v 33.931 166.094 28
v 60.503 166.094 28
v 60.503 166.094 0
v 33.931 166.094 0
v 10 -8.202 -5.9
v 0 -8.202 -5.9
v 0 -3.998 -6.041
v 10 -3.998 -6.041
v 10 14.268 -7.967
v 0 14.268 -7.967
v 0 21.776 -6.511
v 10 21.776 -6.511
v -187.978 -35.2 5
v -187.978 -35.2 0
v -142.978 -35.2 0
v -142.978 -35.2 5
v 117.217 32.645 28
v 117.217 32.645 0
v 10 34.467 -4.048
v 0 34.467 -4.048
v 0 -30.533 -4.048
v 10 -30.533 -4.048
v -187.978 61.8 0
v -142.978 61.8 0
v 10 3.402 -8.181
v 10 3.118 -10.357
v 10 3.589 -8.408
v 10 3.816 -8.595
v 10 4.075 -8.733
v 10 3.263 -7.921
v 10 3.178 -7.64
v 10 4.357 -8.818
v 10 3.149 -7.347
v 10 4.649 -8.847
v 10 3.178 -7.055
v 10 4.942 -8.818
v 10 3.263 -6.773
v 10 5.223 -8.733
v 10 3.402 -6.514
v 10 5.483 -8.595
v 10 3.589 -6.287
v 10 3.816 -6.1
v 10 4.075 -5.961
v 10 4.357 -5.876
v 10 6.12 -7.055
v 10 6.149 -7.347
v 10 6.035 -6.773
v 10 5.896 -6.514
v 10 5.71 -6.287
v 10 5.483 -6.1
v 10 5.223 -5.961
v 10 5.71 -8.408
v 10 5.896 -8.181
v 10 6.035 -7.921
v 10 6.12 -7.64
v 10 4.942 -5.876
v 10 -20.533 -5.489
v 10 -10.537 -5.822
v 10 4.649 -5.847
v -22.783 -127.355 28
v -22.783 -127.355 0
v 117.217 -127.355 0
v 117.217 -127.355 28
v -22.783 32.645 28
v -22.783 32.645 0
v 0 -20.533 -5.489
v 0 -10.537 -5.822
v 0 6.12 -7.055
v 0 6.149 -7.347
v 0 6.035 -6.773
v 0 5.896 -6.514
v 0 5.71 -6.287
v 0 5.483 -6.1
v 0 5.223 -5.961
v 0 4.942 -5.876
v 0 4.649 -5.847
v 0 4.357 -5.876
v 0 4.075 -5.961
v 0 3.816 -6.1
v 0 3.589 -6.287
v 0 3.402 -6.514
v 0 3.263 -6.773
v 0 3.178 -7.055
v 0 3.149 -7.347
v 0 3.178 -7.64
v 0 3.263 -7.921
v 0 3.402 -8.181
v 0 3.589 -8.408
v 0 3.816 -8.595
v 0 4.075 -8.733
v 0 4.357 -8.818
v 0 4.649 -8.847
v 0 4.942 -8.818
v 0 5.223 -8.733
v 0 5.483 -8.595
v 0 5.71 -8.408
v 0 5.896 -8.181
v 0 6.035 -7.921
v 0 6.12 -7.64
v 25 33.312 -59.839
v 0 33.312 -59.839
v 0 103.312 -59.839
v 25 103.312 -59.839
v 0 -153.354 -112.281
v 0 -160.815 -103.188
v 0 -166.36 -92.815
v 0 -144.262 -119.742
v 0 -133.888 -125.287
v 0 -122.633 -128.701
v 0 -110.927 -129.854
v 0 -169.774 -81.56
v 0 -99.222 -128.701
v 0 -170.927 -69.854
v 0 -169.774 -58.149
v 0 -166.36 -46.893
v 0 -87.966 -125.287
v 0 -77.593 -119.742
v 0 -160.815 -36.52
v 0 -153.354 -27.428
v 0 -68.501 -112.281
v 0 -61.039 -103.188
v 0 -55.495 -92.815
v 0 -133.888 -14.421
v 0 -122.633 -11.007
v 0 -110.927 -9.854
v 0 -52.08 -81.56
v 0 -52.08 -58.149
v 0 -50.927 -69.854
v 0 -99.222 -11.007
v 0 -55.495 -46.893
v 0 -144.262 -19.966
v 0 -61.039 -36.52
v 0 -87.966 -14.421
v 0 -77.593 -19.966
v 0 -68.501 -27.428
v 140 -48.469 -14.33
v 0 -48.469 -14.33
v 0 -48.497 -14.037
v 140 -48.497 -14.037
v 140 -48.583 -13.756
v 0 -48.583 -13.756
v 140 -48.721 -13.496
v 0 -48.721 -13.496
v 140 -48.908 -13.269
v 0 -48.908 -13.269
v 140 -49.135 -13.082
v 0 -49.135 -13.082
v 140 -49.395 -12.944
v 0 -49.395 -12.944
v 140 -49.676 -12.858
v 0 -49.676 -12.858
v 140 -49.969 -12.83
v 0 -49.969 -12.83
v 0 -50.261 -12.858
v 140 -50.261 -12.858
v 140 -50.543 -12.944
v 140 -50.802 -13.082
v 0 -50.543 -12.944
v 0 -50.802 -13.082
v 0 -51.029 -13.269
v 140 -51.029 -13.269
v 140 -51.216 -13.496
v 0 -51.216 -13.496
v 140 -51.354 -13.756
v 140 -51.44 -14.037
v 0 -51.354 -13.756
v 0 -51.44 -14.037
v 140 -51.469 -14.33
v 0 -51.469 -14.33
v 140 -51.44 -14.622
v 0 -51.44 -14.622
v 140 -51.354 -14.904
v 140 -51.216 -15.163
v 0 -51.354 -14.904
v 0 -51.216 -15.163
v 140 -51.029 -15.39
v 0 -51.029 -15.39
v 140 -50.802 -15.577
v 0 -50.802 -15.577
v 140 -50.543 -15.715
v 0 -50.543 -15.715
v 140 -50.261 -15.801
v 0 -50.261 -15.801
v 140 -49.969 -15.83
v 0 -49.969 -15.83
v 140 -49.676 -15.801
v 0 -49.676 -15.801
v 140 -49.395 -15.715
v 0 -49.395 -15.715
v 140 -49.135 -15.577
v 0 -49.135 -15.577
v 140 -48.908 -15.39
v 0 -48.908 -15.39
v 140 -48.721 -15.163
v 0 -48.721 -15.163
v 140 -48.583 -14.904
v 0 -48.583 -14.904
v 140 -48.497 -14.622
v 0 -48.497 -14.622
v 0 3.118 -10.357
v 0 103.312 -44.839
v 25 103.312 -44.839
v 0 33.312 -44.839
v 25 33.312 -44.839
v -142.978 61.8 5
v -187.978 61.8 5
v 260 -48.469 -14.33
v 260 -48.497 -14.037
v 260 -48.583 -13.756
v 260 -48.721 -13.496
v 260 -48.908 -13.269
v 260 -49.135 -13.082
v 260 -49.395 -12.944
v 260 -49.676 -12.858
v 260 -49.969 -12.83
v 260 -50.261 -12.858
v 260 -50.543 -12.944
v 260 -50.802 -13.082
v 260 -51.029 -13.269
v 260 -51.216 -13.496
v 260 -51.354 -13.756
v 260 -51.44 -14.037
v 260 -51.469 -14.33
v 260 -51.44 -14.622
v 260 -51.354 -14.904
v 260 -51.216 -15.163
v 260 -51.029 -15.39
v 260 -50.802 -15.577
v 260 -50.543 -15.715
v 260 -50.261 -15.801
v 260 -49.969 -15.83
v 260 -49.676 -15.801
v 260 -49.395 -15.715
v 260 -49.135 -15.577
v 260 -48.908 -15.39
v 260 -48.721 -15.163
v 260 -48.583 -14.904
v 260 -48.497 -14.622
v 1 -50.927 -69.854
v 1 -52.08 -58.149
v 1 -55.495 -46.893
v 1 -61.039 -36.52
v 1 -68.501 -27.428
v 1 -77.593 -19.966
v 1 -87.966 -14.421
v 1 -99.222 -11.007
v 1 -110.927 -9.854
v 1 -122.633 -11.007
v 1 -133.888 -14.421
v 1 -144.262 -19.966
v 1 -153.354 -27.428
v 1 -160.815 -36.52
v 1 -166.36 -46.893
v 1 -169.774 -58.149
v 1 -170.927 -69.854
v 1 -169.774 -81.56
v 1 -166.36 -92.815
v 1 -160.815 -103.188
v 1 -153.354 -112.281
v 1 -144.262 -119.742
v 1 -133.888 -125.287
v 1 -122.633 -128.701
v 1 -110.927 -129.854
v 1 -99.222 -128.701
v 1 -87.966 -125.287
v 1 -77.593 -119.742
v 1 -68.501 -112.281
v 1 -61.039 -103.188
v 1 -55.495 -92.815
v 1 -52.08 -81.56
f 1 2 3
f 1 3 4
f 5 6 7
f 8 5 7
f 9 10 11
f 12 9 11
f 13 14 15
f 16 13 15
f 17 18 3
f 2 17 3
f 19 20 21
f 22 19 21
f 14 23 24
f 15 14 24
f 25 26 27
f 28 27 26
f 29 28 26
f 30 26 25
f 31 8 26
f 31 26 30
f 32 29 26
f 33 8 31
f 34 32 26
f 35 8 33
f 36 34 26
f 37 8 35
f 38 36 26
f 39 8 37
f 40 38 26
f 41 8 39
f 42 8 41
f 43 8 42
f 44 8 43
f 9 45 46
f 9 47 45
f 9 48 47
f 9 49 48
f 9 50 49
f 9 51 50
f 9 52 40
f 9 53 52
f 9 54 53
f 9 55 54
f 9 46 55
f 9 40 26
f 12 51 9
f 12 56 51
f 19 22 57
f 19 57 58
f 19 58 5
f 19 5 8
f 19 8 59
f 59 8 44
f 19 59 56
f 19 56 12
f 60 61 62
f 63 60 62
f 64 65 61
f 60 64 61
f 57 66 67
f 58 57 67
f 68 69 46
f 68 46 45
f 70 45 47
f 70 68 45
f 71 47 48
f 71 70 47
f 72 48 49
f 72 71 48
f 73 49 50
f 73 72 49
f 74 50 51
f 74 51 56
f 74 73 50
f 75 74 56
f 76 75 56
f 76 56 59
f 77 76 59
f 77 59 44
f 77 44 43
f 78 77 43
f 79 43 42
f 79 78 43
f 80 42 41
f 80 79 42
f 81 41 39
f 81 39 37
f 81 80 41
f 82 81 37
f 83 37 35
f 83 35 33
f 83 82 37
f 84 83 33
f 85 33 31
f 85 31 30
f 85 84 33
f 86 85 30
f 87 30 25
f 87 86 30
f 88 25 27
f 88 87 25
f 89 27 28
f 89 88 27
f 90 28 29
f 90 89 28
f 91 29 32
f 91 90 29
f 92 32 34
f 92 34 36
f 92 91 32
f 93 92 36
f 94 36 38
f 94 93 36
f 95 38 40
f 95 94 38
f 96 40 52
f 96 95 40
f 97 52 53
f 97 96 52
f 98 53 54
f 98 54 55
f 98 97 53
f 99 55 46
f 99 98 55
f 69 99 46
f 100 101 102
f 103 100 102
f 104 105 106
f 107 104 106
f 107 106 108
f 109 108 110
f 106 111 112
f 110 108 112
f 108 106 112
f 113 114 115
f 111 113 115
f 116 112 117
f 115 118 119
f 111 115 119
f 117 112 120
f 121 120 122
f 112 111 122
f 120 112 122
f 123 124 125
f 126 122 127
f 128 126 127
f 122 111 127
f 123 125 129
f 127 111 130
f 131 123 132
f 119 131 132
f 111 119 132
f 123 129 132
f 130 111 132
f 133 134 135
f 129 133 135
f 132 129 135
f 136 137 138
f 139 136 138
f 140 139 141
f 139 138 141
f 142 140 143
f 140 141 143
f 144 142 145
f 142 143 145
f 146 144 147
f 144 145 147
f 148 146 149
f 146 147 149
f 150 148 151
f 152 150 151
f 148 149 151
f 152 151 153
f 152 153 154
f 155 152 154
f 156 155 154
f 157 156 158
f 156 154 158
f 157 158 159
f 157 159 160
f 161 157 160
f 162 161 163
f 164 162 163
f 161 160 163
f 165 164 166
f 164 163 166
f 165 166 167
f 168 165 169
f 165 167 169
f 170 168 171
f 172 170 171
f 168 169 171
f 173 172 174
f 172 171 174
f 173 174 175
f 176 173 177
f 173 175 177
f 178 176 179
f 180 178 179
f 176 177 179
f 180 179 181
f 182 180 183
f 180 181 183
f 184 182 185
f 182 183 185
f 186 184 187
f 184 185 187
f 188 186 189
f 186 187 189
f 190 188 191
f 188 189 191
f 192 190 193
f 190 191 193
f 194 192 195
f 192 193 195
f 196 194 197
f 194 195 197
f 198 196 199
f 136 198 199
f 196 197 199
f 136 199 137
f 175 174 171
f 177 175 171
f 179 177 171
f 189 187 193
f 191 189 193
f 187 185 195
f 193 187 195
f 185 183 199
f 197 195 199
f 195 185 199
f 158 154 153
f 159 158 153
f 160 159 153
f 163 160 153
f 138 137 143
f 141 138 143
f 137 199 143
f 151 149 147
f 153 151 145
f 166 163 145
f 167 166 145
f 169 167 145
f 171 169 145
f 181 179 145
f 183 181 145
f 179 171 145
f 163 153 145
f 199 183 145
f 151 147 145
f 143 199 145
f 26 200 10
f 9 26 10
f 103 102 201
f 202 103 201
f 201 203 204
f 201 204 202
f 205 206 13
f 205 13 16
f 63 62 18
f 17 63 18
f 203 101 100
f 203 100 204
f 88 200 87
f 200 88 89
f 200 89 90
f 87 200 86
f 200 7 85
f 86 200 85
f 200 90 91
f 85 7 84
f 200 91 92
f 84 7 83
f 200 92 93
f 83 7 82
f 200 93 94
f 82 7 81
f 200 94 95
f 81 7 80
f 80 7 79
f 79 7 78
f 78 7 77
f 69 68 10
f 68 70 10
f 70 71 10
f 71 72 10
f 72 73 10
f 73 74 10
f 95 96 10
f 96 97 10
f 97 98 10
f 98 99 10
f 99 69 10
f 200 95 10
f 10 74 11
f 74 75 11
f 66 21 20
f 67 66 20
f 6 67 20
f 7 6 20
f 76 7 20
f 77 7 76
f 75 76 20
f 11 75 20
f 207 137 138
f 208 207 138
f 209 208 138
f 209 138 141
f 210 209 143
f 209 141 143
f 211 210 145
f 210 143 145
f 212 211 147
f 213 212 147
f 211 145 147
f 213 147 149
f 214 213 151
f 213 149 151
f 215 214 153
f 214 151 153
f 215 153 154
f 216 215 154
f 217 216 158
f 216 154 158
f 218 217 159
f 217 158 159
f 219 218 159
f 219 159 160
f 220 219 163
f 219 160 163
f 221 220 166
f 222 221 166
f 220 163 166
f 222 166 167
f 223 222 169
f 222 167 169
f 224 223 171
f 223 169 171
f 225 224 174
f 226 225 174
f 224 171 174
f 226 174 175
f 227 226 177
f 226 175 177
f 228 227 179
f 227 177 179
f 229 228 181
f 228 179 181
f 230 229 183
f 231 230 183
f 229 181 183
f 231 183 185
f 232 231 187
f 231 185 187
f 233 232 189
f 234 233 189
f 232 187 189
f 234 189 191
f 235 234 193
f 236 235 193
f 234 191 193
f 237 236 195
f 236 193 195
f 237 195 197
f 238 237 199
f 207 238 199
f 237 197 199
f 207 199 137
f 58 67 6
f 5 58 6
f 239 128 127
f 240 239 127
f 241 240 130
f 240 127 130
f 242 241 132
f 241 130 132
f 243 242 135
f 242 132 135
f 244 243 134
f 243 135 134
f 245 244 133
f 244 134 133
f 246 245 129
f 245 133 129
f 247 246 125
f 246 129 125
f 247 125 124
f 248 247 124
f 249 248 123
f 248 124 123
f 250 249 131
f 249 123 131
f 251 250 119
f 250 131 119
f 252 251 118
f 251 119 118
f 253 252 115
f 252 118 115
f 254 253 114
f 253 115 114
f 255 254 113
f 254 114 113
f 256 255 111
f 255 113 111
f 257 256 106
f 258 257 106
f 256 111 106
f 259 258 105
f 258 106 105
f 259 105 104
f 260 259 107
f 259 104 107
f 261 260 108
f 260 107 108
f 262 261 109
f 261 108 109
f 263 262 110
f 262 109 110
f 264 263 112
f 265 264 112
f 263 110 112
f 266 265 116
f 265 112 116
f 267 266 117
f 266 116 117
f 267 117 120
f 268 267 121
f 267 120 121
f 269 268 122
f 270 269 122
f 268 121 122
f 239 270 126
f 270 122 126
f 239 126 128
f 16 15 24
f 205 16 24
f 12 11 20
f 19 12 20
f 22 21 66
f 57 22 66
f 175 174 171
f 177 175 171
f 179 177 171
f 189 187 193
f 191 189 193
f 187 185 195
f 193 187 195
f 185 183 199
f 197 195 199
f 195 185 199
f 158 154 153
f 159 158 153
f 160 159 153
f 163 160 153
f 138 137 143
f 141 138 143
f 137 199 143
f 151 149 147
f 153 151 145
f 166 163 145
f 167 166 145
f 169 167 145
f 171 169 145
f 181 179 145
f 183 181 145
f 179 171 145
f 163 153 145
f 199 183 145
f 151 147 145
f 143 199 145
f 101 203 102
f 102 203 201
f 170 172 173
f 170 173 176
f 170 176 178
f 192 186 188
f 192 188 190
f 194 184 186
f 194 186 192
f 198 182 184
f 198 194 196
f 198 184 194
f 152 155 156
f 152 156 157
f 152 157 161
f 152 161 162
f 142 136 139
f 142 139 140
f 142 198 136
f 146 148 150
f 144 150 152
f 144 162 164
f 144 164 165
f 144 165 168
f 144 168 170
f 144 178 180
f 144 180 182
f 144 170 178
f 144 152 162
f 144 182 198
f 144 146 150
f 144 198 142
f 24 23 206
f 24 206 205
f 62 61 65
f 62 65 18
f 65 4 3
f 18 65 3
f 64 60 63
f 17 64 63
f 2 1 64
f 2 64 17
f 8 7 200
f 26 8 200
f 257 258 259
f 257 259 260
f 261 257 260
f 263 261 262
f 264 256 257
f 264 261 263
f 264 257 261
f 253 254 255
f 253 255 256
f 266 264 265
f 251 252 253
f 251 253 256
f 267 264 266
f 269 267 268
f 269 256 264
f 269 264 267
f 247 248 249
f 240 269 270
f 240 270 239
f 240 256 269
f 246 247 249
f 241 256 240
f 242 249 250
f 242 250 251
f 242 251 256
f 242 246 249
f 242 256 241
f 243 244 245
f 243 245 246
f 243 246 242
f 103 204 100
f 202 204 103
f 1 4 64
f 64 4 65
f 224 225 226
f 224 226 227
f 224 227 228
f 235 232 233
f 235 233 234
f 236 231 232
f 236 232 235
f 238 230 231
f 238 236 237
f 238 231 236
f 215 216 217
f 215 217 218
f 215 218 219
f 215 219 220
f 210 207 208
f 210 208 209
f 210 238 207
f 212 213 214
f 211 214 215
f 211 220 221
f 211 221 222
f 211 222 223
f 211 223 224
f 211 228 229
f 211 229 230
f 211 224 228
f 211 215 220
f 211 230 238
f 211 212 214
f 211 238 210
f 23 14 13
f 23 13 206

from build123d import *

# Parameters (mm, degrees)
F1_DEPTH = 28
F2_R     = 60
F3_DEPTH = 1
F2_R_2   = 1.5
F4_DEPTH = 260
F5_DEPTH = 10
F2_W     = 70
F2_H     = 15
F6_DEPTH = 25
F0_W     = 45
F0_H     = 97
F7_DEPTH = 5
F8_DEPTH = 140


with BuildPart() as f1:
    # F0 (on Top) → F1 (new body)
    with BuildSketch(Plane.XY):
        Polygon((47.216782, 32.645319), (-22.783218, 32.645319), (-22.783218, -127.354681), (117.216782, -127.354681), (117.216782, 32.645319), align=None)
        Polygon((33.931015, 166.093795), (-22.783218, 32.645319), (47.216782, 32.645319), (47.216782, 166.093795), align=None)
        Polygon((47.216782, 166.093795), (47.216782, 32.645319), (117.216782, 32.645319), (60.502549, 166.093795), align=None)
    extrude(amount=F1_DEPTH)


with BuildPart() as f3:
    # F2 (on Right) → F3 (new body)
    with BuildSketch(Plane.YZ):
        with Locations((-110.927295, -69.854259)):
            Circle(F2_R)
    extrude(amount=F3_DEPTH)


with BuildPart() as f4:
    # F2 (on Right) → F4 (new body)
    with BuildSketch(Plane.YZ):
        with Locations((-49.968604, -14.329593)):
            Circle(F2_R_2)
    extrude(amount=F4_DEPTH)


with BuildPart() as f5:
    # F2 (on Right) → F5 (new body)
    with BuildSketch(Plane.YZ):
        Polygon((-20.532722, -4.048295), (-30.532722, -4.048295), (-20.532722, -5.488549), (-10.536689, -5.822368), (-8.202231, -5.900328), (-3.998438, -6.040714), (3.118484, -10.356675), (14.268117, -7.967468), (21.775685, -6.510801), (34.467278, -4.048295), align=None)
        with Locations((4.649221, -7.3473)):
            Circle(F2_R_2, mode=Mode.SUBTRACT)
    extrude(amount=F5_DEPTH)


with BuildPart() as f6:
    # F2 (on Right) → F6 (new body)
    with BuildSketch(Plane.YZ):
        with Locations((68.311576, -52.339003)):
            Rectangle(F2_W, F2_H)
    extrude(amount=F6_DEPTH)


with BuildPart() as f7:
    # F0 (on Top) → F7 (new body)
    with BuildSketch(Plane.XY):
        with Locations((-165.477746, 13.300339)):
            Rectangle(F0_W, F0_H)
    extrude(amount=F7_DEPTH)


with BuildPart() as f8:
    # F2 (on Right) → F8 (new body)
    with BuildSketch(Plane.YZ):
        with Locations((-49.968604, -14.329593)):
            Circle(F2_R_2)
    extrude(amount=F8_DEPTH)


solid = Compound([f1.part, f3.part, f4.part, f5.part, f6.part, f7.part, f8.part])
